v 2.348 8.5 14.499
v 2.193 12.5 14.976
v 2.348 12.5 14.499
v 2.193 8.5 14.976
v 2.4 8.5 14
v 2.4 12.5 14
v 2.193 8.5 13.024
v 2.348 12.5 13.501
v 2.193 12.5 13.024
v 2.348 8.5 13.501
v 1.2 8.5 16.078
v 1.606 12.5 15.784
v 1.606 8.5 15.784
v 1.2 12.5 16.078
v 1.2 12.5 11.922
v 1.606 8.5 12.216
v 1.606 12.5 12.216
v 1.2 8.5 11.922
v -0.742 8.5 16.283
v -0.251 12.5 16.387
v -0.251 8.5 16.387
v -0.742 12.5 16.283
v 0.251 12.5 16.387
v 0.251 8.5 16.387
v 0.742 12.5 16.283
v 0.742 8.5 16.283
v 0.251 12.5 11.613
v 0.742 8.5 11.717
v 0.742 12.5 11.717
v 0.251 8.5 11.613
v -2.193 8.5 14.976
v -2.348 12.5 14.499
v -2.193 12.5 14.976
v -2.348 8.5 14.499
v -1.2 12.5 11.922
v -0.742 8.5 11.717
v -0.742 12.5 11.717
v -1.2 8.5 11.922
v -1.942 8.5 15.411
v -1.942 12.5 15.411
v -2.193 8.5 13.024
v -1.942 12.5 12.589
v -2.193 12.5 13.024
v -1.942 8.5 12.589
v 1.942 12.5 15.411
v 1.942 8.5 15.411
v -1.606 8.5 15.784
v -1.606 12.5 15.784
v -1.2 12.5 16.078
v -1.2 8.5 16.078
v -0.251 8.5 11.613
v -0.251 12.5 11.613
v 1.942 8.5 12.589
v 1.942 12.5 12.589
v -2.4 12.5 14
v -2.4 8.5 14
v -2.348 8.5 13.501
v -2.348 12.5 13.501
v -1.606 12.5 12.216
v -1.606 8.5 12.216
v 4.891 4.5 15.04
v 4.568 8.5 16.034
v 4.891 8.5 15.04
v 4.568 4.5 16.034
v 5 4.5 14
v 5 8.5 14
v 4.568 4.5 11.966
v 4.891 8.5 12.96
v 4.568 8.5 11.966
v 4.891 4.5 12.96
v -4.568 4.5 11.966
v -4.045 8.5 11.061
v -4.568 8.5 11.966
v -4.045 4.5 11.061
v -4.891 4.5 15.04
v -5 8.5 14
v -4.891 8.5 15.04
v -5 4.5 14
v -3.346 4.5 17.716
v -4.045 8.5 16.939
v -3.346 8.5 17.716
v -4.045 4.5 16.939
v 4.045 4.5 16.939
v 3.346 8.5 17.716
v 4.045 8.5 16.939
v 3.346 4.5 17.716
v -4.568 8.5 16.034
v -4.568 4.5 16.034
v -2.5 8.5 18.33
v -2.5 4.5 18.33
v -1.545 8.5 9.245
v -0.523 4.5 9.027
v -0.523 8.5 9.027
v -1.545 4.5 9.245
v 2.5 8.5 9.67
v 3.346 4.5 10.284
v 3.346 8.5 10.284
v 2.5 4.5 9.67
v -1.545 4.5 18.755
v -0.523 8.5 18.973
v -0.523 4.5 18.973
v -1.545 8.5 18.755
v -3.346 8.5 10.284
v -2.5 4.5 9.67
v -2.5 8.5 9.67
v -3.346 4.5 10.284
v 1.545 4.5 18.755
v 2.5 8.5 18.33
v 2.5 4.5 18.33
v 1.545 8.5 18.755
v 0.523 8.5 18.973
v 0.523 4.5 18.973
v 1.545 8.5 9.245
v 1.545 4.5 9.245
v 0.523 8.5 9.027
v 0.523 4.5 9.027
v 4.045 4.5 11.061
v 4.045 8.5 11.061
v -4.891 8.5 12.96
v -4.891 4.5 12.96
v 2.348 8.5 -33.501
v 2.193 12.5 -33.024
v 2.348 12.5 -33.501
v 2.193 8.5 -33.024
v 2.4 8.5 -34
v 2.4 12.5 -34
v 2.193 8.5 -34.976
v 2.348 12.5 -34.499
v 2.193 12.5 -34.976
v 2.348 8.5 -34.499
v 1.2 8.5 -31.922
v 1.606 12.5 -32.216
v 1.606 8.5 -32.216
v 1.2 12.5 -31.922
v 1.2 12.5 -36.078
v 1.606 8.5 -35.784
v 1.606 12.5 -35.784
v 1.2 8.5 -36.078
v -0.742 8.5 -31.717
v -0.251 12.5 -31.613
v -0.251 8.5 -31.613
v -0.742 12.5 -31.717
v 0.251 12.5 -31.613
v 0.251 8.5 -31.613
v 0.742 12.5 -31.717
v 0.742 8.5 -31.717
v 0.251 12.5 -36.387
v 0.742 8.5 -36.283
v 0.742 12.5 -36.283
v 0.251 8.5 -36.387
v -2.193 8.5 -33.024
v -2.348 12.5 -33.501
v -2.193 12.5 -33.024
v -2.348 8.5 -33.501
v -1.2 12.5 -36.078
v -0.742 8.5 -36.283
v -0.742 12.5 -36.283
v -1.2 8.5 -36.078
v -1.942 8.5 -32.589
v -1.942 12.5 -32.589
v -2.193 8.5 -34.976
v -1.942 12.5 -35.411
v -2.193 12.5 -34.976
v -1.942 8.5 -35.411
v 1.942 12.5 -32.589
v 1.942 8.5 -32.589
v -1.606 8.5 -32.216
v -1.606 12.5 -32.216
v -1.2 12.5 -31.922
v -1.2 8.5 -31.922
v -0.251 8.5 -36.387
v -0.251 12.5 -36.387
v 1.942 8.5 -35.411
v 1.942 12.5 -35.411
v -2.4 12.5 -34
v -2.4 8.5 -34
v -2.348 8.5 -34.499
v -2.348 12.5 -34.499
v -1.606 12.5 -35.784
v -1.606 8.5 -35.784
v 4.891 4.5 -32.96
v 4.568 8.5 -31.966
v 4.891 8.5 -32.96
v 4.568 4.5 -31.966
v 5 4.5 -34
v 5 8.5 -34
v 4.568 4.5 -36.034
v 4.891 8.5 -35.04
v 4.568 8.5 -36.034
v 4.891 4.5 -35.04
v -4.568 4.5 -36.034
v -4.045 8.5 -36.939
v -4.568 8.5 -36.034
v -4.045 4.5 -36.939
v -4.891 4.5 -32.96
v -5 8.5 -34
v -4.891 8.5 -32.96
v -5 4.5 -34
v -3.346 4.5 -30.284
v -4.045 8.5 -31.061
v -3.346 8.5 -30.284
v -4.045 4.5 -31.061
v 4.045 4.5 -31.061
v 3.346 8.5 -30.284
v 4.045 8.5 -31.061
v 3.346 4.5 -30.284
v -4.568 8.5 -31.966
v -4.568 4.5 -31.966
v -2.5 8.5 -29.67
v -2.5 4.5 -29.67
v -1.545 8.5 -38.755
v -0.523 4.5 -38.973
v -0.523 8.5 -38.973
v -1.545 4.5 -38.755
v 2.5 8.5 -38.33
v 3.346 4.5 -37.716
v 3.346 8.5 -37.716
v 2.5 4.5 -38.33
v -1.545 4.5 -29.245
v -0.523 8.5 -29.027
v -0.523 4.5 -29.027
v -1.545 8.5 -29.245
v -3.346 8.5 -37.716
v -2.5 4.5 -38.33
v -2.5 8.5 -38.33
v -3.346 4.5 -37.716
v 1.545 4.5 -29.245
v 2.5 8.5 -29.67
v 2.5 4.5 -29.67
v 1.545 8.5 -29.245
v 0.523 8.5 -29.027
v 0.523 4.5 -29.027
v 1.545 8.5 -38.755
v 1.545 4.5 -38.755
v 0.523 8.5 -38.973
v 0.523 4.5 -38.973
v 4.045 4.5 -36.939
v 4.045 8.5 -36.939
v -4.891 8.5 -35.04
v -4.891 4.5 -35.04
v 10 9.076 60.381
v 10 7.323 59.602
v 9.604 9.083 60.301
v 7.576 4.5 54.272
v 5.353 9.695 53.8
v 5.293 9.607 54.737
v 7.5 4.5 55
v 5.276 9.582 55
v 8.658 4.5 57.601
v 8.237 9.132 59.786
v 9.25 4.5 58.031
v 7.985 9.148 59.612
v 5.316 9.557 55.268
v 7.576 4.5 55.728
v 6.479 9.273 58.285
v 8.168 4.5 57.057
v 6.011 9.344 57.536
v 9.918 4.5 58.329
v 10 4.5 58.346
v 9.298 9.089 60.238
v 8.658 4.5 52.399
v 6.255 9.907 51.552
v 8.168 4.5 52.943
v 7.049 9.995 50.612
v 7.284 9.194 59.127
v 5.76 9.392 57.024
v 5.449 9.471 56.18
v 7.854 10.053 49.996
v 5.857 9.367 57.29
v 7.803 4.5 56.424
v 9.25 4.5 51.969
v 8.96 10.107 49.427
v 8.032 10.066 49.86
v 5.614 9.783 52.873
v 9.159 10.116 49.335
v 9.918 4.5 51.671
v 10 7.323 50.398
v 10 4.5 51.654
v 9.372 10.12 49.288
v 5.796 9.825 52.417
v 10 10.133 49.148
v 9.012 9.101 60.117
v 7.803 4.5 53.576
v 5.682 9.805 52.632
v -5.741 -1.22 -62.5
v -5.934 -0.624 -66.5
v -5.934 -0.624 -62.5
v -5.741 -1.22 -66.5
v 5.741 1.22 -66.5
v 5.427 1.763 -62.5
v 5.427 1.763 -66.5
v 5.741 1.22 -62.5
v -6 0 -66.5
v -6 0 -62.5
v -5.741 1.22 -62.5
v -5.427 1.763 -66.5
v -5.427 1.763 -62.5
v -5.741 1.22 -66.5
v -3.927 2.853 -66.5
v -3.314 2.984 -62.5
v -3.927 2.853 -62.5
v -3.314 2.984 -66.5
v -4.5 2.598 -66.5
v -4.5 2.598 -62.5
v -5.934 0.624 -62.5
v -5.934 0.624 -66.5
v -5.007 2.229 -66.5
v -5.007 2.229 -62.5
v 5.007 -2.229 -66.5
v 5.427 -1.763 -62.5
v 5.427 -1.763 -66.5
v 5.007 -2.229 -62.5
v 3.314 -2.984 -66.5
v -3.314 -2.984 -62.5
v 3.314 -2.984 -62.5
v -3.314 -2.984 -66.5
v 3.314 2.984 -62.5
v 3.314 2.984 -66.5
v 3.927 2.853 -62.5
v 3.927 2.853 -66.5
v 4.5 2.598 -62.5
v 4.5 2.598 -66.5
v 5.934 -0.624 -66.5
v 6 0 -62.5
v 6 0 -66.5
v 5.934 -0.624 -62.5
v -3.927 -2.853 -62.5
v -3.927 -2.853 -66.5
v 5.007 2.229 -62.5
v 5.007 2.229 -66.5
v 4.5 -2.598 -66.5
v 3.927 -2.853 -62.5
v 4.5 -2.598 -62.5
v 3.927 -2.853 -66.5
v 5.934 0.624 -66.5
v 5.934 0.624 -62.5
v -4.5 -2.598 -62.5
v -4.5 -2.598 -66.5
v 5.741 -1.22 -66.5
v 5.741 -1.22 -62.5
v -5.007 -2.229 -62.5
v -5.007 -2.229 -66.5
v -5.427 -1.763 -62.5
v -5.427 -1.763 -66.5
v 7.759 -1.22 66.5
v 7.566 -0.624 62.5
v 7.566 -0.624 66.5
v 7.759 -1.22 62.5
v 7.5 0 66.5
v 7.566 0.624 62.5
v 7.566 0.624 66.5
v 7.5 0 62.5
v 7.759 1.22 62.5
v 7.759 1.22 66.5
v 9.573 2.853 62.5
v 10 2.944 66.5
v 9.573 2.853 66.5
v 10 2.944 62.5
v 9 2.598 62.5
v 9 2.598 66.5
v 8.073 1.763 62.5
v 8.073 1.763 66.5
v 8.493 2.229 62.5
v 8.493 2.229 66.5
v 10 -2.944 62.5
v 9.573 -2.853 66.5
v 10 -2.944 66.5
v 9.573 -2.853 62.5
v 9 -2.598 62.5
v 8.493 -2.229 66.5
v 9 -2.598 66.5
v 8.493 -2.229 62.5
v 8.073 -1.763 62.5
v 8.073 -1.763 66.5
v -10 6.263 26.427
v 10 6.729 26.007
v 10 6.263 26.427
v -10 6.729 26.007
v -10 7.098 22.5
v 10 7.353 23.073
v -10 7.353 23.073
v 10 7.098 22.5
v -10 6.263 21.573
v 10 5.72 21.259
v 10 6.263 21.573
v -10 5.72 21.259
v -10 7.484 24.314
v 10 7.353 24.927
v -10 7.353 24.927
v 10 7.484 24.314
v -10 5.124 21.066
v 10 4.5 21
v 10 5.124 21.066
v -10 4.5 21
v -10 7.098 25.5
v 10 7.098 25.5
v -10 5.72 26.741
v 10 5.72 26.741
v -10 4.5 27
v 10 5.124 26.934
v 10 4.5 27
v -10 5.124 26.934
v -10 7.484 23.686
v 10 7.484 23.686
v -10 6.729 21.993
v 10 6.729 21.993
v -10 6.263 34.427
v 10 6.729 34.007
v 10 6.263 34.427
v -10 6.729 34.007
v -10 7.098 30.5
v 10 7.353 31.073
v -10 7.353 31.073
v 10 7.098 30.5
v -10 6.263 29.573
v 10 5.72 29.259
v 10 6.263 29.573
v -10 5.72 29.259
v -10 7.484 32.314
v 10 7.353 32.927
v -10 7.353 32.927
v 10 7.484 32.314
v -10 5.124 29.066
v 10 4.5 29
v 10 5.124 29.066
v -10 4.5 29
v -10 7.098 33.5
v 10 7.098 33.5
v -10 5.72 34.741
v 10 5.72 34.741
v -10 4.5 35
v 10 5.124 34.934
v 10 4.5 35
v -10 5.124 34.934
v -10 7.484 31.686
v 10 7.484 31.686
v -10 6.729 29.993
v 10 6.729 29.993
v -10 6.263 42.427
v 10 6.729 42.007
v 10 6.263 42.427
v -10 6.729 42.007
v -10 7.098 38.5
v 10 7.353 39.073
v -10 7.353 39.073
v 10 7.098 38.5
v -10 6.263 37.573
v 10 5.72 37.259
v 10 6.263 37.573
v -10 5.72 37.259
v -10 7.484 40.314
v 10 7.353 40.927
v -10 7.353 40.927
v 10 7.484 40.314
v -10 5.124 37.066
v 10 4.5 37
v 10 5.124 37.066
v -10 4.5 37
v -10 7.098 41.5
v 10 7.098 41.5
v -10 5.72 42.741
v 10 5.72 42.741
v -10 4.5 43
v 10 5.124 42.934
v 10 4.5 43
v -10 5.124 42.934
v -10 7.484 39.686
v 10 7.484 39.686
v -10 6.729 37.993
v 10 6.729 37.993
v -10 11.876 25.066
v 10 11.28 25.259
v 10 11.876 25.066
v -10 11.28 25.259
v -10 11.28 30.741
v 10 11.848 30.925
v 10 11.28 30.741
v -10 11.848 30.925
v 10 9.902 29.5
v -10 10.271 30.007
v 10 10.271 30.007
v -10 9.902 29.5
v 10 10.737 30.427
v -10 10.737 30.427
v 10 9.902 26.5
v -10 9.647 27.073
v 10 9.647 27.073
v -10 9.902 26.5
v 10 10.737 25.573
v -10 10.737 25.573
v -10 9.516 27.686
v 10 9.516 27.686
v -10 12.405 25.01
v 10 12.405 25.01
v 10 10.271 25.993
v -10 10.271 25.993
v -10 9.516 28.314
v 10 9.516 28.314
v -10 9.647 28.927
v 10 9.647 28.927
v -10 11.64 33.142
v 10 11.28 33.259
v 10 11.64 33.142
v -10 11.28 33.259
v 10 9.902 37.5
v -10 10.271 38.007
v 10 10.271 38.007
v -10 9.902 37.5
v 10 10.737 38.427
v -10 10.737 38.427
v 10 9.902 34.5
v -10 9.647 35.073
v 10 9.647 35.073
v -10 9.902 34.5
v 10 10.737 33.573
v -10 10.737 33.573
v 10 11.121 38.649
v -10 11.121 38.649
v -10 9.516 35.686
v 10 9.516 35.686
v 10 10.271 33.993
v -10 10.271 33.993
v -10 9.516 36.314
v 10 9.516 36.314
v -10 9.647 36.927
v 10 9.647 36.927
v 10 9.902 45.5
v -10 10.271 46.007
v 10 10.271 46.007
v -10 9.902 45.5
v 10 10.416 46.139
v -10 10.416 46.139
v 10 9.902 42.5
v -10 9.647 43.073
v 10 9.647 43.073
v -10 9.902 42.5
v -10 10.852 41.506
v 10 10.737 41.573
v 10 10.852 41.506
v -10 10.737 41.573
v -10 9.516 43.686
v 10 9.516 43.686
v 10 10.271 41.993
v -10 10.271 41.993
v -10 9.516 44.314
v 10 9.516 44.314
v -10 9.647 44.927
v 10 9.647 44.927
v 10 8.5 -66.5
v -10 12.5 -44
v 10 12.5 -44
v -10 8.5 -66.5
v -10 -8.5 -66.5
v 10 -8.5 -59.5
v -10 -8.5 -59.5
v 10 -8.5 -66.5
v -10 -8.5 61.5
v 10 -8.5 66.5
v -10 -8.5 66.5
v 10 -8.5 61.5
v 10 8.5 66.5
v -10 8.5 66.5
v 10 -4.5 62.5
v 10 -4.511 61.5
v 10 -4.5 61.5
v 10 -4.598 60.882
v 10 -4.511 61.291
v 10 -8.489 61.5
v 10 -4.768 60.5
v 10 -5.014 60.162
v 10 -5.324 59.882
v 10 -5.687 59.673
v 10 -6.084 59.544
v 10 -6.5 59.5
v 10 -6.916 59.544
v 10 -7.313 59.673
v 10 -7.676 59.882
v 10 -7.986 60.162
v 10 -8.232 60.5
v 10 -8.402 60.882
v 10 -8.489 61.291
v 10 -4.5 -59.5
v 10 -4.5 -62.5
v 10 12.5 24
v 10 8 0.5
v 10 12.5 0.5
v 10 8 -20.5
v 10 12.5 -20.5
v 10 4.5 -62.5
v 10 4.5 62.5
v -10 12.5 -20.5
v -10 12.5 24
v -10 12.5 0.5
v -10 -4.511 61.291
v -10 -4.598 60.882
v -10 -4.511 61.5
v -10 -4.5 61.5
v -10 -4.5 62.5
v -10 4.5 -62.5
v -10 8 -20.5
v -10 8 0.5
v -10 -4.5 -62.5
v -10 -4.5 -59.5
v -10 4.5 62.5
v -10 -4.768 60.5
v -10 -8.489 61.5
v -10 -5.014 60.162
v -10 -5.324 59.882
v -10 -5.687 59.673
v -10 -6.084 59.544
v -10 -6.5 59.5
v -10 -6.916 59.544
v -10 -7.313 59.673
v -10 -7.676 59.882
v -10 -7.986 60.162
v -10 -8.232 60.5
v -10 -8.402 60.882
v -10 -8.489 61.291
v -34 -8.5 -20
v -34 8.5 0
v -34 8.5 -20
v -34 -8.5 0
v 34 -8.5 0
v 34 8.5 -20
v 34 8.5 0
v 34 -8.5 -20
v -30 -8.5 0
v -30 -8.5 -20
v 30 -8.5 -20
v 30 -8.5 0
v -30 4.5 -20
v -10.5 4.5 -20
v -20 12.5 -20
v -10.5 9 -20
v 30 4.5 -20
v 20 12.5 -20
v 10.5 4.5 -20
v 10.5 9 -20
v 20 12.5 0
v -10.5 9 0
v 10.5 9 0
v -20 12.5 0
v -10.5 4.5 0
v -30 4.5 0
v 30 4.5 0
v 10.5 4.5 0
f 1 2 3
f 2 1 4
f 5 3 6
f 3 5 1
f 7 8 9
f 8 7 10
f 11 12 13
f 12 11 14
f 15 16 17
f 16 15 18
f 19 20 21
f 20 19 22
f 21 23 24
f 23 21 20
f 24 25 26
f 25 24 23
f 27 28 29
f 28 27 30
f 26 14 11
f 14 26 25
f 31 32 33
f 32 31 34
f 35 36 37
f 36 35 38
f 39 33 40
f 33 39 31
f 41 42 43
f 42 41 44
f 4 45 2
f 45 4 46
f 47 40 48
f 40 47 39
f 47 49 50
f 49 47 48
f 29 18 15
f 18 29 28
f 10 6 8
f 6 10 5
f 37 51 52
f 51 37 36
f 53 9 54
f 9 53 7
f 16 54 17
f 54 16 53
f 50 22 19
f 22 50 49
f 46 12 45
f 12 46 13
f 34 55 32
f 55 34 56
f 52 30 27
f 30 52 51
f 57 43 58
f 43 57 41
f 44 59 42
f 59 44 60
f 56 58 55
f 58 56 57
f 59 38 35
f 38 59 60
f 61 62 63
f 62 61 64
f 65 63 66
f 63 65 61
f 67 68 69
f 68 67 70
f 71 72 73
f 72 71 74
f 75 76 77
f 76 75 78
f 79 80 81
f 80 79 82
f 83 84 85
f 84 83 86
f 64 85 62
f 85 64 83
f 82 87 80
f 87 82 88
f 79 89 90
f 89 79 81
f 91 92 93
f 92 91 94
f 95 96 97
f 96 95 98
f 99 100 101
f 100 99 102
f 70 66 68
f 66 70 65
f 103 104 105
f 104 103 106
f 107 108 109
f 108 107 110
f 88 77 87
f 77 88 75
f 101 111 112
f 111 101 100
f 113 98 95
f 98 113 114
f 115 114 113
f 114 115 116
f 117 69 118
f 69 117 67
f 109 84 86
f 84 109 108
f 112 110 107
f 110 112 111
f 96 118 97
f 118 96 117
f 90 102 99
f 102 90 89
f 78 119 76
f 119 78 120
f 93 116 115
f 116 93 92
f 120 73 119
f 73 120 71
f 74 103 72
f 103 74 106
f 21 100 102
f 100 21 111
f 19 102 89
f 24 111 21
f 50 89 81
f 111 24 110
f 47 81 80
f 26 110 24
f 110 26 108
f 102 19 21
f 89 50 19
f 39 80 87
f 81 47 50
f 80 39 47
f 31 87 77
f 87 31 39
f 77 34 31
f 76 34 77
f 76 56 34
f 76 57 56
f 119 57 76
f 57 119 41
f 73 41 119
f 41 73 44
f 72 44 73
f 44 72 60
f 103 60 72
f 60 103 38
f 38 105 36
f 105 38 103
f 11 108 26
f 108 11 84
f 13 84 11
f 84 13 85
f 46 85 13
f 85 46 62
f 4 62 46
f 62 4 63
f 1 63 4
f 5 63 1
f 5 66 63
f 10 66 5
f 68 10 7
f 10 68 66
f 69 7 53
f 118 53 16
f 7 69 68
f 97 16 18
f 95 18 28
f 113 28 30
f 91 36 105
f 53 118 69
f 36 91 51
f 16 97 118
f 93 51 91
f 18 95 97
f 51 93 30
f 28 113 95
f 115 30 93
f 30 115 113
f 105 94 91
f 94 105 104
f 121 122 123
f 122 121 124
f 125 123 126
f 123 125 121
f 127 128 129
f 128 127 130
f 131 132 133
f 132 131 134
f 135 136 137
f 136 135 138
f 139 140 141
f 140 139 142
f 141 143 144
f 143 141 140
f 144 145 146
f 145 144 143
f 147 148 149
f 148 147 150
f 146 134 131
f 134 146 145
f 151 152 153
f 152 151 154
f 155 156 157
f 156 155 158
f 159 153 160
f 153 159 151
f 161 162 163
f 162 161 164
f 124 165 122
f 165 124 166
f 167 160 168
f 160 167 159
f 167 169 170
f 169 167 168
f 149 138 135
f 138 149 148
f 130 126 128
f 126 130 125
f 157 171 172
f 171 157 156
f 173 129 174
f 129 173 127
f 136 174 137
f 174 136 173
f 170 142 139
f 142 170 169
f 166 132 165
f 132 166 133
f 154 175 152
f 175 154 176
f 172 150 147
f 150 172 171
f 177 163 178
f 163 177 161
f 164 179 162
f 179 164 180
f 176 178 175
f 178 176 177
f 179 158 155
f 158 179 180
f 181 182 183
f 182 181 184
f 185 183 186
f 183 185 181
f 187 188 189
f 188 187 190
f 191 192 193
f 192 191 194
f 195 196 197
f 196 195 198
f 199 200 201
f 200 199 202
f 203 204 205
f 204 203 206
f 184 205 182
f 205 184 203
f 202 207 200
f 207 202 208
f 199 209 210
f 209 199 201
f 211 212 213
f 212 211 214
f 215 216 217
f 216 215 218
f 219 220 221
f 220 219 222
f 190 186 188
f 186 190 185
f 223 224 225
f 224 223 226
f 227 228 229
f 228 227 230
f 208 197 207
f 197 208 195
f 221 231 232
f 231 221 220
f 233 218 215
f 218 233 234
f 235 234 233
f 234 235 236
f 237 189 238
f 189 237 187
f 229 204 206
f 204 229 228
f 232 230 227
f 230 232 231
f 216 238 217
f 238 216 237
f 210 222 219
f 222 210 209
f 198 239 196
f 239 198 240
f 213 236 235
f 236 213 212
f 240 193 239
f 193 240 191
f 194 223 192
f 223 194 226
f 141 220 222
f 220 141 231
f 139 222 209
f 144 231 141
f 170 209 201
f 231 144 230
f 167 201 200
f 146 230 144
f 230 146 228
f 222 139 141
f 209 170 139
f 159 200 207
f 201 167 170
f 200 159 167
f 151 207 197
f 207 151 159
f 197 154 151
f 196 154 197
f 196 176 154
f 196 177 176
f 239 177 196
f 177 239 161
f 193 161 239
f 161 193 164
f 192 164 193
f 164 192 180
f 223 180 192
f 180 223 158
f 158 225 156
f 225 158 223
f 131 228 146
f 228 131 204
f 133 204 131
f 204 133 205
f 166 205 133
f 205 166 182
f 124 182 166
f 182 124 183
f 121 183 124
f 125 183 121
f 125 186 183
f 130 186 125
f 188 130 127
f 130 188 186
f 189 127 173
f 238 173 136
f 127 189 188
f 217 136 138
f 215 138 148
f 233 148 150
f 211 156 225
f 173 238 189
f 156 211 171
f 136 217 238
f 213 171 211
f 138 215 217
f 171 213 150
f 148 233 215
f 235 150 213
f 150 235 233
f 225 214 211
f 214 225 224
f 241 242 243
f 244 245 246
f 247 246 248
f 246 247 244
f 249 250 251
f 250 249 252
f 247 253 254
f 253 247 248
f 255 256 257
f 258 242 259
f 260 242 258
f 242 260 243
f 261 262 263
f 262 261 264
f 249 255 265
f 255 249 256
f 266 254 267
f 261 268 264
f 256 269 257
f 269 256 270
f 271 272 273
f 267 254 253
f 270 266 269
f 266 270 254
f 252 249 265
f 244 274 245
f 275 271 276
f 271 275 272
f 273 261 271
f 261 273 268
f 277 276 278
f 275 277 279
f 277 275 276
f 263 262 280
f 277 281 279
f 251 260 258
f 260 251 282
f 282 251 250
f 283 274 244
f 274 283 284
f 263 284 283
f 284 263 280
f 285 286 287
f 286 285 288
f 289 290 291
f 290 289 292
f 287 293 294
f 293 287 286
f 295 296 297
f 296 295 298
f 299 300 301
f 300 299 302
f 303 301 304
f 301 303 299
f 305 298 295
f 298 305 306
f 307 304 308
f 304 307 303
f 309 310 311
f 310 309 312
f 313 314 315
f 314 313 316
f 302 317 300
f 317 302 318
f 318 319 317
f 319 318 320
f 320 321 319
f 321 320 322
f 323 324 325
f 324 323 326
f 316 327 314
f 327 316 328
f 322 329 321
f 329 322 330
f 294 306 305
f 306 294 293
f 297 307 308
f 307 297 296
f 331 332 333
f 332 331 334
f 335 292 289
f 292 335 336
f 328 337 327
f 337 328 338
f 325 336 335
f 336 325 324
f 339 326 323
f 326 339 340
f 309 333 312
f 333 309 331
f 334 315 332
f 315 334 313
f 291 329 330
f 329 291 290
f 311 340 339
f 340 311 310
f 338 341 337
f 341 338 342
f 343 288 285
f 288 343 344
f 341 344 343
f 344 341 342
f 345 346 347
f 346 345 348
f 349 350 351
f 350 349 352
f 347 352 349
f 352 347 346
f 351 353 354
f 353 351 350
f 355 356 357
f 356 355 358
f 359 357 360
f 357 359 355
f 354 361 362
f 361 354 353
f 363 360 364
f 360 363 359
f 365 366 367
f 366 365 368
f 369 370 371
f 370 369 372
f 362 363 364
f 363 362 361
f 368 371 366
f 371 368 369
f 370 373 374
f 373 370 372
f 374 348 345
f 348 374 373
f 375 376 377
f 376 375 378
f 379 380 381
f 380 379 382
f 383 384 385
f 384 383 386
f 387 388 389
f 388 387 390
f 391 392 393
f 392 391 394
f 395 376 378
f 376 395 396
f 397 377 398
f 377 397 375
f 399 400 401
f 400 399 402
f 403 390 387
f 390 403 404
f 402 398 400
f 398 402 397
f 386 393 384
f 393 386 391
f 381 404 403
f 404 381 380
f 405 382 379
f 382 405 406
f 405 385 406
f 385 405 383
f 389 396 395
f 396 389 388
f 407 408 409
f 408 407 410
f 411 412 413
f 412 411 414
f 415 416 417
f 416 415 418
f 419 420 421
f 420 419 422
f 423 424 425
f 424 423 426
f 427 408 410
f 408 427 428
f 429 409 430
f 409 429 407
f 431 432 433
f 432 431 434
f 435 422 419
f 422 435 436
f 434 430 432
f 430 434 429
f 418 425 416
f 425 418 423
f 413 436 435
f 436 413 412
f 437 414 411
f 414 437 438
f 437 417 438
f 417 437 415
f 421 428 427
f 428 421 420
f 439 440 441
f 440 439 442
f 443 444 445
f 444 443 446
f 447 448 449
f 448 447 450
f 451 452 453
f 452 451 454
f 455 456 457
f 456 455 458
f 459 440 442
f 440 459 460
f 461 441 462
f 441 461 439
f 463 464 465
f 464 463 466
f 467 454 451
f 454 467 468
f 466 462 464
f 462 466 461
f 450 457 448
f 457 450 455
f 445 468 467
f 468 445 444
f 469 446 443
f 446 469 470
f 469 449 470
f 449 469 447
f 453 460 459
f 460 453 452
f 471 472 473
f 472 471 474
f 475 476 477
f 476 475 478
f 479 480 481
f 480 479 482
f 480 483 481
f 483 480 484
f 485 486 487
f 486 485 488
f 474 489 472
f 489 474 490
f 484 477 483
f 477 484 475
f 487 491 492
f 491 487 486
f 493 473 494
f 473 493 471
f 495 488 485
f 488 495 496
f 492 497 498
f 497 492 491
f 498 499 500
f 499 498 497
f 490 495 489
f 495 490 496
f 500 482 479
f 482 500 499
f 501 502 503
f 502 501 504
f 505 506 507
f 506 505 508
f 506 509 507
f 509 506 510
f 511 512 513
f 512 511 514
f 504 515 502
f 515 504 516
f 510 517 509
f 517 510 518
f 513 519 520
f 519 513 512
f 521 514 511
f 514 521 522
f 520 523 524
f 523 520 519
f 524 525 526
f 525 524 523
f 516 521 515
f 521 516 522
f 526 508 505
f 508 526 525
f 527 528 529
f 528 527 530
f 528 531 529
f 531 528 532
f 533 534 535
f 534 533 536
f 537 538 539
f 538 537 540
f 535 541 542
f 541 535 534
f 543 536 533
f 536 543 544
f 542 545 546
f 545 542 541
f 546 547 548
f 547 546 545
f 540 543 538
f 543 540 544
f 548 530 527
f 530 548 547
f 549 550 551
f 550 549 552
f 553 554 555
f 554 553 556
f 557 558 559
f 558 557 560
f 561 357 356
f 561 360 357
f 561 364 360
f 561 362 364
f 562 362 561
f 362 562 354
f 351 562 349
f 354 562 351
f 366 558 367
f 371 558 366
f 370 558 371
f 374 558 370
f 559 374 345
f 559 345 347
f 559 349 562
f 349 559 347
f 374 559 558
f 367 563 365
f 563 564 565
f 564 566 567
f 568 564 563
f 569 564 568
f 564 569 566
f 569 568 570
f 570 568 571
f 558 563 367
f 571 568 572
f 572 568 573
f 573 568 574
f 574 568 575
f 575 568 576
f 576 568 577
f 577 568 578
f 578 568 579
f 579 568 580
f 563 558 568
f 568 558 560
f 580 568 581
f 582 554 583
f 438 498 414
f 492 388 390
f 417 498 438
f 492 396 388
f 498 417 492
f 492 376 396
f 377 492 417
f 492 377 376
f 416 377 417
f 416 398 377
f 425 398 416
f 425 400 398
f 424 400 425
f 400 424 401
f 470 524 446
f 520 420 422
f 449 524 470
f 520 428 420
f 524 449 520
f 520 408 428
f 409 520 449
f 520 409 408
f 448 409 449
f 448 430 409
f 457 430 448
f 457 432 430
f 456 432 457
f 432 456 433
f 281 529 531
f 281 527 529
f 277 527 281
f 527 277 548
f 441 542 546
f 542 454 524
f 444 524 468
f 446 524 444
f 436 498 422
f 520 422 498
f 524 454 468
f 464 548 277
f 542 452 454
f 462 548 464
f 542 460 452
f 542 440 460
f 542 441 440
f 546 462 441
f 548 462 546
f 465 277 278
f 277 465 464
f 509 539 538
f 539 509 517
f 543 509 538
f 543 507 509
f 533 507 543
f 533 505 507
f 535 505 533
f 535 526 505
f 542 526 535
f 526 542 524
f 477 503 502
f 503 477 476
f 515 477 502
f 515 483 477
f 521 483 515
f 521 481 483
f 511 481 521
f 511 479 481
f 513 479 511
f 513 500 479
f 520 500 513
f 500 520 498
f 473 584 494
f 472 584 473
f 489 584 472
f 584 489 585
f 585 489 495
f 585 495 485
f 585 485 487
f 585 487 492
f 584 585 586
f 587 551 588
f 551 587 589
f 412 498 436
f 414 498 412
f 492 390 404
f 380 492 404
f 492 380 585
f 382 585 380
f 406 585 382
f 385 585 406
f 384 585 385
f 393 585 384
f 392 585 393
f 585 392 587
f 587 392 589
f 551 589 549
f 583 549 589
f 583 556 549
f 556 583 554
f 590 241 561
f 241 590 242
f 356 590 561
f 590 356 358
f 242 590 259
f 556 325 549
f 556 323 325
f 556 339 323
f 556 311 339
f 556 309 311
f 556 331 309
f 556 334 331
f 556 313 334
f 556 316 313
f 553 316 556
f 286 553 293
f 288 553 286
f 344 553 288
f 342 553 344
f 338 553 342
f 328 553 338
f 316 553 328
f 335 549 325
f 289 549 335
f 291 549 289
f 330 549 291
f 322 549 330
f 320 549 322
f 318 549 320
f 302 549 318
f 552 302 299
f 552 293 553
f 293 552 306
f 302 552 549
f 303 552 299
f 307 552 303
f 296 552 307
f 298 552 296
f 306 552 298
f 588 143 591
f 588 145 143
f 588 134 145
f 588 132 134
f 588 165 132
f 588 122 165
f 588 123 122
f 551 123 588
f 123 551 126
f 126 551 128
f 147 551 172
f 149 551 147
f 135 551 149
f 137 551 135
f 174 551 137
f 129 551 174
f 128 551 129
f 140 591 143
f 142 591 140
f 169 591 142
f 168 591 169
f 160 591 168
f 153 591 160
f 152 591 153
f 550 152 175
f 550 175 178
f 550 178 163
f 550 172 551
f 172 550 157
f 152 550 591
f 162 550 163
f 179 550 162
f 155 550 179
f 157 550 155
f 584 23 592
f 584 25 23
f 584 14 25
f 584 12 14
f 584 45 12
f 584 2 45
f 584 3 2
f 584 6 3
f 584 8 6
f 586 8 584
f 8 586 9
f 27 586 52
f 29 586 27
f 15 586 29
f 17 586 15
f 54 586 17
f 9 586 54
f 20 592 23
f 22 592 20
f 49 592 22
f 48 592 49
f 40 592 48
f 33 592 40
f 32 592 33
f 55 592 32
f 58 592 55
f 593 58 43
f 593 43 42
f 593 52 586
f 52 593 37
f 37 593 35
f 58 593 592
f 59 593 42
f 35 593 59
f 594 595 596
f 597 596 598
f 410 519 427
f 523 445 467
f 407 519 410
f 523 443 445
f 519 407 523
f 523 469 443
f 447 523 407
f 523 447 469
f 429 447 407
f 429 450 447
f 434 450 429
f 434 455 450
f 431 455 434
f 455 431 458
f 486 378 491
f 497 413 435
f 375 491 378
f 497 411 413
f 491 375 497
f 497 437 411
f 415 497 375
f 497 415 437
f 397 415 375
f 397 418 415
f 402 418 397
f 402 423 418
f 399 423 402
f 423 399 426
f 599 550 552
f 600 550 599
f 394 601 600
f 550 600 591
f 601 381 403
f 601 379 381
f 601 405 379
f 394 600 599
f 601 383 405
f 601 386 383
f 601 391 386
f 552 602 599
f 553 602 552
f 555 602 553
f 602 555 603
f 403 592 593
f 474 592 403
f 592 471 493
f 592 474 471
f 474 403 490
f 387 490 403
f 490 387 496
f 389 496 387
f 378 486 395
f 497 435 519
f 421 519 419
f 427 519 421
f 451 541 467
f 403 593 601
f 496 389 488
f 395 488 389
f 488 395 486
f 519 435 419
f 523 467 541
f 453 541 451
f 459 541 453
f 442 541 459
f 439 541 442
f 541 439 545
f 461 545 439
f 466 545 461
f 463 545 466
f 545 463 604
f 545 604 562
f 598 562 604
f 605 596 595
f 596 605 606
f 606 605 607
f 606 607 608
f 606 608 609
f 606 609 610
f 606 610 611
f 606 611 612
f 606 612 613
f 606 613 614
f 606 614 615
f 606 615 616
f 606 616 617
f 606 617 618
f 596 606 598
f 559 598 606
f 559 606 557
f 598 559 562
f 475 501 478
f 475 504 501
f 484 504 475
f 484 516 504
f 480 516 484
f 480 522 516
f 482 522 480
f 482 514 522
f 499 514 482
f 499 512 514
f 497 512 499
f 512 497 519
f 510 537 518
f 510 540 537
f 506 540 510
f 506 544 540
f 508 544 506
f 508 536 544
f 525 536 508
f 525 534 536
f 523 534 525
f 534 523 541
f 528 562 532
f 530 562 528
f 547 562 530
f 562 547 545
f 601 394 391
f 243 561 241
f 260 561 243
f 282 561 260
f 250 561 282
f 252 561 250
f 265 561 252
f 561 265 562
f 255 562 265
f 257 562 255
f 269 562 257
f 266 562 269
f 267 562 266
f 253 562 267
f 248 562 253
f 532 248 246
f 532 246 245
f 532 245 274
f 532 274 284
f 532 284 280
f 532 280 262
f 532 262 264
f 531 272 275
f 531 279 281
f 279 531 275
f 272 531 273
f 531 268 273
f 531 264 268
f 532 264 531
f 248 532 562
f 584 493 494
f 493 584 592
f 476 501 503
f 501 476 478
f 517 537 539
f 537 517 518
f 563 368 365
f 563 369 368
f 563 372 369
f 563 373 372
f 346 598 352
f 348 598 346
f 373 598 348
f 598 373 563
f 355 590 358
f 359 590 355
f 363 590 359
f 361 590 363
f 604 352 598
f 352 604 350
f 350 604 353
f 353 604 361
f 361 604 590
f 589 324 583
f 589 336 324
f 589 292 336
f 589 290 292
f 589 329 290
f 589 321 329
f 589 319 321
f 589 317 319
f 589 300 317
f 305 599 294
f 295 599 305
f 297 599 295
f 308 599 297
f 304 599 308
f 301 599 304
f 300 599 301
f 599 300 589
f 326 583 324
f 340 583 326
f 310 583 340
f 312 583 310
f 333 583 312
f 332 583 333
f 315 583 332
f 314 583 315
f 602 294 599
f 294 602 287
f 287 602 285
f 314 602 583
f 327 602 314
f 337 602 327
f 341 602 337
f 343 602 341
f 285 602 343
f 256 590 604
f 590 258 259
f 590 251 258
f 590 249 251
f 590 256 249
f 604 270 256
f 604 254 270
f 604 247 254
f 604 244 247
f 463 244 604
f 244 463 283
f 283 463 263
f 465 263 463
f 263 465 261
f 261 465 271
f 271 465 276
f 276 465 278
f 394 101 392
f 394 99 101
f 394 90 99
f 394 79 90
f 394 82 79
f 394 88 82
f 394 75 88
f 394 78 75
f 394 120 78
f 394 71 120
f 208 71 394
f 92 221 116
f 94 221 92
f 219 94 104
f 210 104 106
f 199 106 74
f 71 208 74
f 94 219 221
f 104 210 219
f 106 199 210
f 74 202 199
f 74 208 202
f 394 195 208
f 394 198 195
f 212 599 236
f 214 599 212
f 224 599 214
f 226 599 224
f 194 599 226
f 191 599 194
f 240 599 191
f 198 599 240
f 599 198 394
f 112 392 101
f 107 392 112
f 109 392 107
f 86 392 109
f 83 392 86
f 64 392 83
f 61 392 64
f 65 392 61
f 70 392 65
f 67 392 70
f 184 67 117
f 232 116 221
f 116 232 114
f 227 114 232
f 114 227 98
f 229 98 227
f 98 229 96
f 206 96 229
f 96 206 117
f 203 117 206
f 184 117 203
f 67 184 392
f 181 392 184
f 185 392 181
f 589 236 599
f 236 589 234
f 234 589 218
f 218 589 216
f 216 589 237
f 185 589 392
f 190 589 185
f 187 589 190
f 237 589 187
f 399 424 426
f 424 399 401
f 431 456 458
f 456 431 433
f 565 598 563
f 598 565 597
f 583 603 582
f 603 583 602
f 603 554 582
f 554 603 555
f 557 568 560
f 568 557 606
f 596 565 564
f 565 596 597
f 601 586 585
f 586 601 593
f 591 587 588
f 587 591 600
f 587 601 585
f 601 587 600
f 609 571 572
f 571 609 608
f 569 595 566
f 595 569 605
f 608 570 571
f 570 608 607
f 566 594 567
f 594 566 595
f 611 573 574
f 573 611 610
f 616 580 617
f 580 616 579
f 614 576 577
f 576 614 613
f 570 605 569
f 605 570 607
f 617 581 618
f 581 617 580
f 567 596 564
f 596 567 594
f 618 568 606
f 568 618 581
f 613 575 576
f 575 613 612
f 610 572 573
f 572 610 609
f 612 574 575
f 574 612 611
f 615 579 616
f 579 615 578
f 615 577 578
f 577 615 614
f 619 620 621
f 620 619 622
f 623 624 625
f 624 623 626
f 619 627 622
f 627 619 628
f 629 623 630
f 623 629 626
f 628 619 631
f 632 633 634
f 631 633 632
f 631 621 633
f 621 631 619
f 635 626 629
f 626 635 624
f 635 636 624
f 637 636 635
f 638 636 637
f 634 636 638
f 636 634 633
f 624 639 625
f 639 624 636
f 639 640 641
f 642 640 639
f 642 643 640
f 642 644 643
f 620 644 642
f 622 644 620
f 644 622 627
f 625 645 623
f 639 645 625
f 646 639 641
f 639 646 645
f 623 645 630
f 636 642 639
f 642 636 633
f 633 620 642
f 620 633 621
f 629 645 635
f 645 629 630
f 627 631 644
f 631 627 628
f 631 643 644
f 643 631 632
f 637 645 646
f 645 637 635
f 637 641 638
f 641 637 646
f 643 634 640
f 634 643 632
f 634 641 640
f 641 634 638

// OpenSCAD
// Customizable RAM Mount Phone Clip

/* [Options] */

// Select which part to display.
part = "both"; // [horizontal:Horizontal Clip, vertical:Vertical Clip, both:Complete Assembly]

// Cutouts for iPhone 5c sleep button, flash, and power connector. Assumes default dimensions.
iphone_tweaks = 1; // [0:Disabled, 1:Enabled]

// Wavy cutouts in vertical clip to increase flexibility for insertion and removal. Assumes default dimensions.
flex_ridges = 1; // [0:Disabled, 1:Enabled]

/* [Phone] */

// Controls size of horizontal clip. (mm)
phone_width = 60;

// Controls size of vertical clip. (mm)
phone_height = 125;

// Phone thickness; controls size of arms on both clips. (mm)
phone_depth = 9;

/* [Clips] */

// Minimum thickness of clips. Clips are twice as thick where they cross. (mm)
clip_thickness = 4;

// Clip height, as oriented for printing. (mm)
clip_width = 20;

// Size of grips on front face of phone. Top grip is rounded to ease phone insertion and removal. (mm)
grip_width = 3;

// Enable grips on horizontal cross clip. This holds the phone more securely but makes insertion and removal more difficult.
cross_grips = 0; // [0:Disabled, 1:Enabled]

// Location of horizontal cross clip relative to center of vertical clip. Also controls location of mounting holes. (mm)
cross_offset = -10;

// Sandwich horizontal cross clip between vertical clip and which object?
cross_side = 1; // [0:Phone, 1:Mounting Bracket]

// Fudge factor added to size of assembly notches on each clip. (mm)
cross_tolerance = 0.5;

/* [Mount] */

// Spacing between center of mounting holes. Holes are centered where clips cross. (mm)
bolt_spacing = 48;

// Diameter of bolt holes. (mm)
bolt_diameter = 4.8;

// Diameter of recess for bolt heads. (mm)
head_diameter = 10;

/* [Hidden] */

bolt_radius = bolt_diameter/2;
head_radius = head_diameter/2;
bolt_offset = bolt_spacing/2;
$fn = 30;


SelectPart();

module SelectPart() {
	if (part == "horizontal") {
		translate([0, 0, clip_width/2-cross_offset])
		HorizontalClip();
	}
	else if (part == "vertical") {
		translate([0, 0, clip_width/2])
		rotate([0, -90, 0])
		VerticalClip();
	}
	else {
		VerticalClip();
		HorizontalClip();
	}
}

function hnotch_depth(side) = (side == 0 ? clip_thickness*2 - cross_tolerance : cross_tolerance);
function vnotch_depth(side) = (side == 0 ? cross_tolerance : clip_thickness*2 - cross_tolerance);

// clip that spans the phone's width; sandwiched between vertical clip and RAM socket.
module HorizontalClip() {
	translate([0, 0, cross_offset])
	difference() {
		
		hull() {
			// main clip
			cube([phone_width + (2 * clip_thickness), phone_depth + (2 * clip_thickness), clip_width], center=true);
			
			// back plate (x width *2 is arbitrary!)
			translate([0, phone_depth/2 + clip_thickness*3/2, 0])
			cube([(clip_width + phone_width) / 2, clip_thickness, clip_width], center=true);
		}
		
		PhoneBlock();
		FacePlate(cross_grips);
		
		// notch for vertical clip - not a clean cut in preview
		translate([0, phone_depth/2 + hnotch_depth(cross_side), 0])
		cube([clip_width+ (cross_tolerance*2), clip_thickness*2, clip_width*2], center=true); // y*2, z*2 for clean cut
	}
}

// clip that spans the phone's height; has bolt holes for RAM socket.
module VerticalClip() {
	
	// rounded nubbin for top attachment
	translate([0, -phone_depth/2 - clip_thickness/2, phone_height/2 - grip_width + clip_thickness/2])
	rotate([0, 90, 0])
	cylinder(h=clip_width, r=clip_thickness/2, center=true);
	
	difference() {
		
		hull() {
			// main clip
			cube([clip_width, phone_depth + (2 * clip_thickness), phone_height + (2 * clip_thickness)], center=true);
			// back plate
			translate([0, phone_depth/2 + clip_thickness*3/2, cross_offset]) cube([clip_width, clip_thickness, bolt_spacing + clip_width], center=true);
		}

		PhoneBlock();
		FacePlate();
		BoltHoles();
		
		// trim a bit from the top grip - we'll use the rounded nubbin instead
		translate([0, -phone_depth/2-clip_thickness/2, phone_height/2-grip_width])
		cube([clip_width + 2, clip_thickness+1, clip_thickness], center=true);
		
		// notch for horizontal clip
		translate([0, phone_depth/2 + vnotch_depth(cross_side), cross_offset])
		cube([clip_width*2, clip_thickness*2, clip_width + (cross_tolerance*2)], center=true); // x*2, y*2 for clean cut
		
		
		if (iphone_tweaks == 1) {
			PlugHole();
			ButtonHole();
			FlashHole();
		}
		
		if (flex_ridges == 1) {
			FlexCuts();
		}
	}
}

module FlexCuts() {
	FlexCut();
	translate([0, 0, 8]) FlexCut();
	translate([0, 0, 16]) FlexCut();
	translate([0, clip_thickness*2, 4]) FlexCut();
	translate([0, clip_thickness*2, 12]) FlexCut();
	translate([0, clip_thickness*2, 20]) FlexCut();
}

module FlexCut() {
	translate([0, phone_depth/2, cross_offset + (bolt_spacing/2) + (clip_width/2)])
	rotate([0, 90, 0])
	cylinder(h=clip_width+2, r=3, center=true);
}

module BoltHoles() {
	translate([0, 0, cross_offset + bolt_offset]) BoltHole();
	translate([0, 0, cross_offset - bolt_offset]) BoltHole();
}

module BoltHole() {
	union() {
		// bolt hole
		translate([0, phone_depth/2 + clip_thickness, 0])
		rotate([90, 0, 0])
		cylinder(r=bolt_radius, h=clip_thickness*3, center=true);
		
		// recess for bolt head
		translate([0, phone_depth/2, 0])
		rotate([90, 0, 0])
		cylinder(r=head_radius, h=clip_thickness*2, center=true);
	}
}

// cutout for sleep/power button at top of vertical clip
module ButtonHole() {
	assign(button_width=14, button_depth=6, button_x=14.5) {
		translate([button_x, 0, phone_height/2 + clip_thickness/2])
		linear_extrude(height=clip_thickness * 2, center=true) // *2 for clean cut
		hull() {
			translate([-(button_width - button_depth) / 2, 0, 0]) circle(r=button_depth/2);
			translate([(button_width - button_depth) / 2, 0, 0]) circle(r=button_depth/2);
		}
	}
}

// cutout for power connector, assumed to be centered at bottom of phone
module PlugHole() {
	assign(plug_width=12, plug_depth=6) {
		translate([0, 0, -phone_height/2-clip_thickness/2])
		linear_extrude(height=clip_thickness * 2, center=true) // *2 for clean cut
		hull() {
			translate([-(plug_width - plug_depth) / 2, 0, 0]) circle(r=plug_depth/2);
			translate([(plug_width - plug_depth) / 2, 0, 0]) circle(r=plug_depth/2);
		}
	}
}

// cutout for flash on top back of vertical clip
module FlashHole() {
	assign(innerd = 7, outerd = 14, offset_x = 11, inset_y = 7.5) {
		
		// just for clean cut
		translate([offset_x, phone_depth/2, phone_height/2 - inset_y])
		rotate([90, 0, 0])
		cylinder(h = clip_thickness, r = innerd/2, center=true);

		translate([offset_x, phone_depth/2 + clip_thickness, phone_height/2 - inset_y])
		rotate([-90, 0, 0])
		cylinder(h = clip_thickness * 2, r1 = innerd/2, r2 = outerd/2, center=true);
	}
}

// mockup model of phone used to delete space from clips
module PhoneBlock() {
	cube([phone_width, phone_depth, phone_height], center=true);
}

// area in front of phone that is deleted from clips for front opening
module FacePlate(grips=1) {
	translate([0, -phone_depth/2 - clip_thickness/2, 0])
	cube([	phone_width - (grips == 1 ? (2 * grip_width) : 0 /*- clip_thickness*3*/),
			clip_thickness * 2, // *2 is excess for clean cut
			phone_height - (grips == 1 ? (2 * grip_width) : 0 /*- clip_thickness*3*/)], center=true);
}
